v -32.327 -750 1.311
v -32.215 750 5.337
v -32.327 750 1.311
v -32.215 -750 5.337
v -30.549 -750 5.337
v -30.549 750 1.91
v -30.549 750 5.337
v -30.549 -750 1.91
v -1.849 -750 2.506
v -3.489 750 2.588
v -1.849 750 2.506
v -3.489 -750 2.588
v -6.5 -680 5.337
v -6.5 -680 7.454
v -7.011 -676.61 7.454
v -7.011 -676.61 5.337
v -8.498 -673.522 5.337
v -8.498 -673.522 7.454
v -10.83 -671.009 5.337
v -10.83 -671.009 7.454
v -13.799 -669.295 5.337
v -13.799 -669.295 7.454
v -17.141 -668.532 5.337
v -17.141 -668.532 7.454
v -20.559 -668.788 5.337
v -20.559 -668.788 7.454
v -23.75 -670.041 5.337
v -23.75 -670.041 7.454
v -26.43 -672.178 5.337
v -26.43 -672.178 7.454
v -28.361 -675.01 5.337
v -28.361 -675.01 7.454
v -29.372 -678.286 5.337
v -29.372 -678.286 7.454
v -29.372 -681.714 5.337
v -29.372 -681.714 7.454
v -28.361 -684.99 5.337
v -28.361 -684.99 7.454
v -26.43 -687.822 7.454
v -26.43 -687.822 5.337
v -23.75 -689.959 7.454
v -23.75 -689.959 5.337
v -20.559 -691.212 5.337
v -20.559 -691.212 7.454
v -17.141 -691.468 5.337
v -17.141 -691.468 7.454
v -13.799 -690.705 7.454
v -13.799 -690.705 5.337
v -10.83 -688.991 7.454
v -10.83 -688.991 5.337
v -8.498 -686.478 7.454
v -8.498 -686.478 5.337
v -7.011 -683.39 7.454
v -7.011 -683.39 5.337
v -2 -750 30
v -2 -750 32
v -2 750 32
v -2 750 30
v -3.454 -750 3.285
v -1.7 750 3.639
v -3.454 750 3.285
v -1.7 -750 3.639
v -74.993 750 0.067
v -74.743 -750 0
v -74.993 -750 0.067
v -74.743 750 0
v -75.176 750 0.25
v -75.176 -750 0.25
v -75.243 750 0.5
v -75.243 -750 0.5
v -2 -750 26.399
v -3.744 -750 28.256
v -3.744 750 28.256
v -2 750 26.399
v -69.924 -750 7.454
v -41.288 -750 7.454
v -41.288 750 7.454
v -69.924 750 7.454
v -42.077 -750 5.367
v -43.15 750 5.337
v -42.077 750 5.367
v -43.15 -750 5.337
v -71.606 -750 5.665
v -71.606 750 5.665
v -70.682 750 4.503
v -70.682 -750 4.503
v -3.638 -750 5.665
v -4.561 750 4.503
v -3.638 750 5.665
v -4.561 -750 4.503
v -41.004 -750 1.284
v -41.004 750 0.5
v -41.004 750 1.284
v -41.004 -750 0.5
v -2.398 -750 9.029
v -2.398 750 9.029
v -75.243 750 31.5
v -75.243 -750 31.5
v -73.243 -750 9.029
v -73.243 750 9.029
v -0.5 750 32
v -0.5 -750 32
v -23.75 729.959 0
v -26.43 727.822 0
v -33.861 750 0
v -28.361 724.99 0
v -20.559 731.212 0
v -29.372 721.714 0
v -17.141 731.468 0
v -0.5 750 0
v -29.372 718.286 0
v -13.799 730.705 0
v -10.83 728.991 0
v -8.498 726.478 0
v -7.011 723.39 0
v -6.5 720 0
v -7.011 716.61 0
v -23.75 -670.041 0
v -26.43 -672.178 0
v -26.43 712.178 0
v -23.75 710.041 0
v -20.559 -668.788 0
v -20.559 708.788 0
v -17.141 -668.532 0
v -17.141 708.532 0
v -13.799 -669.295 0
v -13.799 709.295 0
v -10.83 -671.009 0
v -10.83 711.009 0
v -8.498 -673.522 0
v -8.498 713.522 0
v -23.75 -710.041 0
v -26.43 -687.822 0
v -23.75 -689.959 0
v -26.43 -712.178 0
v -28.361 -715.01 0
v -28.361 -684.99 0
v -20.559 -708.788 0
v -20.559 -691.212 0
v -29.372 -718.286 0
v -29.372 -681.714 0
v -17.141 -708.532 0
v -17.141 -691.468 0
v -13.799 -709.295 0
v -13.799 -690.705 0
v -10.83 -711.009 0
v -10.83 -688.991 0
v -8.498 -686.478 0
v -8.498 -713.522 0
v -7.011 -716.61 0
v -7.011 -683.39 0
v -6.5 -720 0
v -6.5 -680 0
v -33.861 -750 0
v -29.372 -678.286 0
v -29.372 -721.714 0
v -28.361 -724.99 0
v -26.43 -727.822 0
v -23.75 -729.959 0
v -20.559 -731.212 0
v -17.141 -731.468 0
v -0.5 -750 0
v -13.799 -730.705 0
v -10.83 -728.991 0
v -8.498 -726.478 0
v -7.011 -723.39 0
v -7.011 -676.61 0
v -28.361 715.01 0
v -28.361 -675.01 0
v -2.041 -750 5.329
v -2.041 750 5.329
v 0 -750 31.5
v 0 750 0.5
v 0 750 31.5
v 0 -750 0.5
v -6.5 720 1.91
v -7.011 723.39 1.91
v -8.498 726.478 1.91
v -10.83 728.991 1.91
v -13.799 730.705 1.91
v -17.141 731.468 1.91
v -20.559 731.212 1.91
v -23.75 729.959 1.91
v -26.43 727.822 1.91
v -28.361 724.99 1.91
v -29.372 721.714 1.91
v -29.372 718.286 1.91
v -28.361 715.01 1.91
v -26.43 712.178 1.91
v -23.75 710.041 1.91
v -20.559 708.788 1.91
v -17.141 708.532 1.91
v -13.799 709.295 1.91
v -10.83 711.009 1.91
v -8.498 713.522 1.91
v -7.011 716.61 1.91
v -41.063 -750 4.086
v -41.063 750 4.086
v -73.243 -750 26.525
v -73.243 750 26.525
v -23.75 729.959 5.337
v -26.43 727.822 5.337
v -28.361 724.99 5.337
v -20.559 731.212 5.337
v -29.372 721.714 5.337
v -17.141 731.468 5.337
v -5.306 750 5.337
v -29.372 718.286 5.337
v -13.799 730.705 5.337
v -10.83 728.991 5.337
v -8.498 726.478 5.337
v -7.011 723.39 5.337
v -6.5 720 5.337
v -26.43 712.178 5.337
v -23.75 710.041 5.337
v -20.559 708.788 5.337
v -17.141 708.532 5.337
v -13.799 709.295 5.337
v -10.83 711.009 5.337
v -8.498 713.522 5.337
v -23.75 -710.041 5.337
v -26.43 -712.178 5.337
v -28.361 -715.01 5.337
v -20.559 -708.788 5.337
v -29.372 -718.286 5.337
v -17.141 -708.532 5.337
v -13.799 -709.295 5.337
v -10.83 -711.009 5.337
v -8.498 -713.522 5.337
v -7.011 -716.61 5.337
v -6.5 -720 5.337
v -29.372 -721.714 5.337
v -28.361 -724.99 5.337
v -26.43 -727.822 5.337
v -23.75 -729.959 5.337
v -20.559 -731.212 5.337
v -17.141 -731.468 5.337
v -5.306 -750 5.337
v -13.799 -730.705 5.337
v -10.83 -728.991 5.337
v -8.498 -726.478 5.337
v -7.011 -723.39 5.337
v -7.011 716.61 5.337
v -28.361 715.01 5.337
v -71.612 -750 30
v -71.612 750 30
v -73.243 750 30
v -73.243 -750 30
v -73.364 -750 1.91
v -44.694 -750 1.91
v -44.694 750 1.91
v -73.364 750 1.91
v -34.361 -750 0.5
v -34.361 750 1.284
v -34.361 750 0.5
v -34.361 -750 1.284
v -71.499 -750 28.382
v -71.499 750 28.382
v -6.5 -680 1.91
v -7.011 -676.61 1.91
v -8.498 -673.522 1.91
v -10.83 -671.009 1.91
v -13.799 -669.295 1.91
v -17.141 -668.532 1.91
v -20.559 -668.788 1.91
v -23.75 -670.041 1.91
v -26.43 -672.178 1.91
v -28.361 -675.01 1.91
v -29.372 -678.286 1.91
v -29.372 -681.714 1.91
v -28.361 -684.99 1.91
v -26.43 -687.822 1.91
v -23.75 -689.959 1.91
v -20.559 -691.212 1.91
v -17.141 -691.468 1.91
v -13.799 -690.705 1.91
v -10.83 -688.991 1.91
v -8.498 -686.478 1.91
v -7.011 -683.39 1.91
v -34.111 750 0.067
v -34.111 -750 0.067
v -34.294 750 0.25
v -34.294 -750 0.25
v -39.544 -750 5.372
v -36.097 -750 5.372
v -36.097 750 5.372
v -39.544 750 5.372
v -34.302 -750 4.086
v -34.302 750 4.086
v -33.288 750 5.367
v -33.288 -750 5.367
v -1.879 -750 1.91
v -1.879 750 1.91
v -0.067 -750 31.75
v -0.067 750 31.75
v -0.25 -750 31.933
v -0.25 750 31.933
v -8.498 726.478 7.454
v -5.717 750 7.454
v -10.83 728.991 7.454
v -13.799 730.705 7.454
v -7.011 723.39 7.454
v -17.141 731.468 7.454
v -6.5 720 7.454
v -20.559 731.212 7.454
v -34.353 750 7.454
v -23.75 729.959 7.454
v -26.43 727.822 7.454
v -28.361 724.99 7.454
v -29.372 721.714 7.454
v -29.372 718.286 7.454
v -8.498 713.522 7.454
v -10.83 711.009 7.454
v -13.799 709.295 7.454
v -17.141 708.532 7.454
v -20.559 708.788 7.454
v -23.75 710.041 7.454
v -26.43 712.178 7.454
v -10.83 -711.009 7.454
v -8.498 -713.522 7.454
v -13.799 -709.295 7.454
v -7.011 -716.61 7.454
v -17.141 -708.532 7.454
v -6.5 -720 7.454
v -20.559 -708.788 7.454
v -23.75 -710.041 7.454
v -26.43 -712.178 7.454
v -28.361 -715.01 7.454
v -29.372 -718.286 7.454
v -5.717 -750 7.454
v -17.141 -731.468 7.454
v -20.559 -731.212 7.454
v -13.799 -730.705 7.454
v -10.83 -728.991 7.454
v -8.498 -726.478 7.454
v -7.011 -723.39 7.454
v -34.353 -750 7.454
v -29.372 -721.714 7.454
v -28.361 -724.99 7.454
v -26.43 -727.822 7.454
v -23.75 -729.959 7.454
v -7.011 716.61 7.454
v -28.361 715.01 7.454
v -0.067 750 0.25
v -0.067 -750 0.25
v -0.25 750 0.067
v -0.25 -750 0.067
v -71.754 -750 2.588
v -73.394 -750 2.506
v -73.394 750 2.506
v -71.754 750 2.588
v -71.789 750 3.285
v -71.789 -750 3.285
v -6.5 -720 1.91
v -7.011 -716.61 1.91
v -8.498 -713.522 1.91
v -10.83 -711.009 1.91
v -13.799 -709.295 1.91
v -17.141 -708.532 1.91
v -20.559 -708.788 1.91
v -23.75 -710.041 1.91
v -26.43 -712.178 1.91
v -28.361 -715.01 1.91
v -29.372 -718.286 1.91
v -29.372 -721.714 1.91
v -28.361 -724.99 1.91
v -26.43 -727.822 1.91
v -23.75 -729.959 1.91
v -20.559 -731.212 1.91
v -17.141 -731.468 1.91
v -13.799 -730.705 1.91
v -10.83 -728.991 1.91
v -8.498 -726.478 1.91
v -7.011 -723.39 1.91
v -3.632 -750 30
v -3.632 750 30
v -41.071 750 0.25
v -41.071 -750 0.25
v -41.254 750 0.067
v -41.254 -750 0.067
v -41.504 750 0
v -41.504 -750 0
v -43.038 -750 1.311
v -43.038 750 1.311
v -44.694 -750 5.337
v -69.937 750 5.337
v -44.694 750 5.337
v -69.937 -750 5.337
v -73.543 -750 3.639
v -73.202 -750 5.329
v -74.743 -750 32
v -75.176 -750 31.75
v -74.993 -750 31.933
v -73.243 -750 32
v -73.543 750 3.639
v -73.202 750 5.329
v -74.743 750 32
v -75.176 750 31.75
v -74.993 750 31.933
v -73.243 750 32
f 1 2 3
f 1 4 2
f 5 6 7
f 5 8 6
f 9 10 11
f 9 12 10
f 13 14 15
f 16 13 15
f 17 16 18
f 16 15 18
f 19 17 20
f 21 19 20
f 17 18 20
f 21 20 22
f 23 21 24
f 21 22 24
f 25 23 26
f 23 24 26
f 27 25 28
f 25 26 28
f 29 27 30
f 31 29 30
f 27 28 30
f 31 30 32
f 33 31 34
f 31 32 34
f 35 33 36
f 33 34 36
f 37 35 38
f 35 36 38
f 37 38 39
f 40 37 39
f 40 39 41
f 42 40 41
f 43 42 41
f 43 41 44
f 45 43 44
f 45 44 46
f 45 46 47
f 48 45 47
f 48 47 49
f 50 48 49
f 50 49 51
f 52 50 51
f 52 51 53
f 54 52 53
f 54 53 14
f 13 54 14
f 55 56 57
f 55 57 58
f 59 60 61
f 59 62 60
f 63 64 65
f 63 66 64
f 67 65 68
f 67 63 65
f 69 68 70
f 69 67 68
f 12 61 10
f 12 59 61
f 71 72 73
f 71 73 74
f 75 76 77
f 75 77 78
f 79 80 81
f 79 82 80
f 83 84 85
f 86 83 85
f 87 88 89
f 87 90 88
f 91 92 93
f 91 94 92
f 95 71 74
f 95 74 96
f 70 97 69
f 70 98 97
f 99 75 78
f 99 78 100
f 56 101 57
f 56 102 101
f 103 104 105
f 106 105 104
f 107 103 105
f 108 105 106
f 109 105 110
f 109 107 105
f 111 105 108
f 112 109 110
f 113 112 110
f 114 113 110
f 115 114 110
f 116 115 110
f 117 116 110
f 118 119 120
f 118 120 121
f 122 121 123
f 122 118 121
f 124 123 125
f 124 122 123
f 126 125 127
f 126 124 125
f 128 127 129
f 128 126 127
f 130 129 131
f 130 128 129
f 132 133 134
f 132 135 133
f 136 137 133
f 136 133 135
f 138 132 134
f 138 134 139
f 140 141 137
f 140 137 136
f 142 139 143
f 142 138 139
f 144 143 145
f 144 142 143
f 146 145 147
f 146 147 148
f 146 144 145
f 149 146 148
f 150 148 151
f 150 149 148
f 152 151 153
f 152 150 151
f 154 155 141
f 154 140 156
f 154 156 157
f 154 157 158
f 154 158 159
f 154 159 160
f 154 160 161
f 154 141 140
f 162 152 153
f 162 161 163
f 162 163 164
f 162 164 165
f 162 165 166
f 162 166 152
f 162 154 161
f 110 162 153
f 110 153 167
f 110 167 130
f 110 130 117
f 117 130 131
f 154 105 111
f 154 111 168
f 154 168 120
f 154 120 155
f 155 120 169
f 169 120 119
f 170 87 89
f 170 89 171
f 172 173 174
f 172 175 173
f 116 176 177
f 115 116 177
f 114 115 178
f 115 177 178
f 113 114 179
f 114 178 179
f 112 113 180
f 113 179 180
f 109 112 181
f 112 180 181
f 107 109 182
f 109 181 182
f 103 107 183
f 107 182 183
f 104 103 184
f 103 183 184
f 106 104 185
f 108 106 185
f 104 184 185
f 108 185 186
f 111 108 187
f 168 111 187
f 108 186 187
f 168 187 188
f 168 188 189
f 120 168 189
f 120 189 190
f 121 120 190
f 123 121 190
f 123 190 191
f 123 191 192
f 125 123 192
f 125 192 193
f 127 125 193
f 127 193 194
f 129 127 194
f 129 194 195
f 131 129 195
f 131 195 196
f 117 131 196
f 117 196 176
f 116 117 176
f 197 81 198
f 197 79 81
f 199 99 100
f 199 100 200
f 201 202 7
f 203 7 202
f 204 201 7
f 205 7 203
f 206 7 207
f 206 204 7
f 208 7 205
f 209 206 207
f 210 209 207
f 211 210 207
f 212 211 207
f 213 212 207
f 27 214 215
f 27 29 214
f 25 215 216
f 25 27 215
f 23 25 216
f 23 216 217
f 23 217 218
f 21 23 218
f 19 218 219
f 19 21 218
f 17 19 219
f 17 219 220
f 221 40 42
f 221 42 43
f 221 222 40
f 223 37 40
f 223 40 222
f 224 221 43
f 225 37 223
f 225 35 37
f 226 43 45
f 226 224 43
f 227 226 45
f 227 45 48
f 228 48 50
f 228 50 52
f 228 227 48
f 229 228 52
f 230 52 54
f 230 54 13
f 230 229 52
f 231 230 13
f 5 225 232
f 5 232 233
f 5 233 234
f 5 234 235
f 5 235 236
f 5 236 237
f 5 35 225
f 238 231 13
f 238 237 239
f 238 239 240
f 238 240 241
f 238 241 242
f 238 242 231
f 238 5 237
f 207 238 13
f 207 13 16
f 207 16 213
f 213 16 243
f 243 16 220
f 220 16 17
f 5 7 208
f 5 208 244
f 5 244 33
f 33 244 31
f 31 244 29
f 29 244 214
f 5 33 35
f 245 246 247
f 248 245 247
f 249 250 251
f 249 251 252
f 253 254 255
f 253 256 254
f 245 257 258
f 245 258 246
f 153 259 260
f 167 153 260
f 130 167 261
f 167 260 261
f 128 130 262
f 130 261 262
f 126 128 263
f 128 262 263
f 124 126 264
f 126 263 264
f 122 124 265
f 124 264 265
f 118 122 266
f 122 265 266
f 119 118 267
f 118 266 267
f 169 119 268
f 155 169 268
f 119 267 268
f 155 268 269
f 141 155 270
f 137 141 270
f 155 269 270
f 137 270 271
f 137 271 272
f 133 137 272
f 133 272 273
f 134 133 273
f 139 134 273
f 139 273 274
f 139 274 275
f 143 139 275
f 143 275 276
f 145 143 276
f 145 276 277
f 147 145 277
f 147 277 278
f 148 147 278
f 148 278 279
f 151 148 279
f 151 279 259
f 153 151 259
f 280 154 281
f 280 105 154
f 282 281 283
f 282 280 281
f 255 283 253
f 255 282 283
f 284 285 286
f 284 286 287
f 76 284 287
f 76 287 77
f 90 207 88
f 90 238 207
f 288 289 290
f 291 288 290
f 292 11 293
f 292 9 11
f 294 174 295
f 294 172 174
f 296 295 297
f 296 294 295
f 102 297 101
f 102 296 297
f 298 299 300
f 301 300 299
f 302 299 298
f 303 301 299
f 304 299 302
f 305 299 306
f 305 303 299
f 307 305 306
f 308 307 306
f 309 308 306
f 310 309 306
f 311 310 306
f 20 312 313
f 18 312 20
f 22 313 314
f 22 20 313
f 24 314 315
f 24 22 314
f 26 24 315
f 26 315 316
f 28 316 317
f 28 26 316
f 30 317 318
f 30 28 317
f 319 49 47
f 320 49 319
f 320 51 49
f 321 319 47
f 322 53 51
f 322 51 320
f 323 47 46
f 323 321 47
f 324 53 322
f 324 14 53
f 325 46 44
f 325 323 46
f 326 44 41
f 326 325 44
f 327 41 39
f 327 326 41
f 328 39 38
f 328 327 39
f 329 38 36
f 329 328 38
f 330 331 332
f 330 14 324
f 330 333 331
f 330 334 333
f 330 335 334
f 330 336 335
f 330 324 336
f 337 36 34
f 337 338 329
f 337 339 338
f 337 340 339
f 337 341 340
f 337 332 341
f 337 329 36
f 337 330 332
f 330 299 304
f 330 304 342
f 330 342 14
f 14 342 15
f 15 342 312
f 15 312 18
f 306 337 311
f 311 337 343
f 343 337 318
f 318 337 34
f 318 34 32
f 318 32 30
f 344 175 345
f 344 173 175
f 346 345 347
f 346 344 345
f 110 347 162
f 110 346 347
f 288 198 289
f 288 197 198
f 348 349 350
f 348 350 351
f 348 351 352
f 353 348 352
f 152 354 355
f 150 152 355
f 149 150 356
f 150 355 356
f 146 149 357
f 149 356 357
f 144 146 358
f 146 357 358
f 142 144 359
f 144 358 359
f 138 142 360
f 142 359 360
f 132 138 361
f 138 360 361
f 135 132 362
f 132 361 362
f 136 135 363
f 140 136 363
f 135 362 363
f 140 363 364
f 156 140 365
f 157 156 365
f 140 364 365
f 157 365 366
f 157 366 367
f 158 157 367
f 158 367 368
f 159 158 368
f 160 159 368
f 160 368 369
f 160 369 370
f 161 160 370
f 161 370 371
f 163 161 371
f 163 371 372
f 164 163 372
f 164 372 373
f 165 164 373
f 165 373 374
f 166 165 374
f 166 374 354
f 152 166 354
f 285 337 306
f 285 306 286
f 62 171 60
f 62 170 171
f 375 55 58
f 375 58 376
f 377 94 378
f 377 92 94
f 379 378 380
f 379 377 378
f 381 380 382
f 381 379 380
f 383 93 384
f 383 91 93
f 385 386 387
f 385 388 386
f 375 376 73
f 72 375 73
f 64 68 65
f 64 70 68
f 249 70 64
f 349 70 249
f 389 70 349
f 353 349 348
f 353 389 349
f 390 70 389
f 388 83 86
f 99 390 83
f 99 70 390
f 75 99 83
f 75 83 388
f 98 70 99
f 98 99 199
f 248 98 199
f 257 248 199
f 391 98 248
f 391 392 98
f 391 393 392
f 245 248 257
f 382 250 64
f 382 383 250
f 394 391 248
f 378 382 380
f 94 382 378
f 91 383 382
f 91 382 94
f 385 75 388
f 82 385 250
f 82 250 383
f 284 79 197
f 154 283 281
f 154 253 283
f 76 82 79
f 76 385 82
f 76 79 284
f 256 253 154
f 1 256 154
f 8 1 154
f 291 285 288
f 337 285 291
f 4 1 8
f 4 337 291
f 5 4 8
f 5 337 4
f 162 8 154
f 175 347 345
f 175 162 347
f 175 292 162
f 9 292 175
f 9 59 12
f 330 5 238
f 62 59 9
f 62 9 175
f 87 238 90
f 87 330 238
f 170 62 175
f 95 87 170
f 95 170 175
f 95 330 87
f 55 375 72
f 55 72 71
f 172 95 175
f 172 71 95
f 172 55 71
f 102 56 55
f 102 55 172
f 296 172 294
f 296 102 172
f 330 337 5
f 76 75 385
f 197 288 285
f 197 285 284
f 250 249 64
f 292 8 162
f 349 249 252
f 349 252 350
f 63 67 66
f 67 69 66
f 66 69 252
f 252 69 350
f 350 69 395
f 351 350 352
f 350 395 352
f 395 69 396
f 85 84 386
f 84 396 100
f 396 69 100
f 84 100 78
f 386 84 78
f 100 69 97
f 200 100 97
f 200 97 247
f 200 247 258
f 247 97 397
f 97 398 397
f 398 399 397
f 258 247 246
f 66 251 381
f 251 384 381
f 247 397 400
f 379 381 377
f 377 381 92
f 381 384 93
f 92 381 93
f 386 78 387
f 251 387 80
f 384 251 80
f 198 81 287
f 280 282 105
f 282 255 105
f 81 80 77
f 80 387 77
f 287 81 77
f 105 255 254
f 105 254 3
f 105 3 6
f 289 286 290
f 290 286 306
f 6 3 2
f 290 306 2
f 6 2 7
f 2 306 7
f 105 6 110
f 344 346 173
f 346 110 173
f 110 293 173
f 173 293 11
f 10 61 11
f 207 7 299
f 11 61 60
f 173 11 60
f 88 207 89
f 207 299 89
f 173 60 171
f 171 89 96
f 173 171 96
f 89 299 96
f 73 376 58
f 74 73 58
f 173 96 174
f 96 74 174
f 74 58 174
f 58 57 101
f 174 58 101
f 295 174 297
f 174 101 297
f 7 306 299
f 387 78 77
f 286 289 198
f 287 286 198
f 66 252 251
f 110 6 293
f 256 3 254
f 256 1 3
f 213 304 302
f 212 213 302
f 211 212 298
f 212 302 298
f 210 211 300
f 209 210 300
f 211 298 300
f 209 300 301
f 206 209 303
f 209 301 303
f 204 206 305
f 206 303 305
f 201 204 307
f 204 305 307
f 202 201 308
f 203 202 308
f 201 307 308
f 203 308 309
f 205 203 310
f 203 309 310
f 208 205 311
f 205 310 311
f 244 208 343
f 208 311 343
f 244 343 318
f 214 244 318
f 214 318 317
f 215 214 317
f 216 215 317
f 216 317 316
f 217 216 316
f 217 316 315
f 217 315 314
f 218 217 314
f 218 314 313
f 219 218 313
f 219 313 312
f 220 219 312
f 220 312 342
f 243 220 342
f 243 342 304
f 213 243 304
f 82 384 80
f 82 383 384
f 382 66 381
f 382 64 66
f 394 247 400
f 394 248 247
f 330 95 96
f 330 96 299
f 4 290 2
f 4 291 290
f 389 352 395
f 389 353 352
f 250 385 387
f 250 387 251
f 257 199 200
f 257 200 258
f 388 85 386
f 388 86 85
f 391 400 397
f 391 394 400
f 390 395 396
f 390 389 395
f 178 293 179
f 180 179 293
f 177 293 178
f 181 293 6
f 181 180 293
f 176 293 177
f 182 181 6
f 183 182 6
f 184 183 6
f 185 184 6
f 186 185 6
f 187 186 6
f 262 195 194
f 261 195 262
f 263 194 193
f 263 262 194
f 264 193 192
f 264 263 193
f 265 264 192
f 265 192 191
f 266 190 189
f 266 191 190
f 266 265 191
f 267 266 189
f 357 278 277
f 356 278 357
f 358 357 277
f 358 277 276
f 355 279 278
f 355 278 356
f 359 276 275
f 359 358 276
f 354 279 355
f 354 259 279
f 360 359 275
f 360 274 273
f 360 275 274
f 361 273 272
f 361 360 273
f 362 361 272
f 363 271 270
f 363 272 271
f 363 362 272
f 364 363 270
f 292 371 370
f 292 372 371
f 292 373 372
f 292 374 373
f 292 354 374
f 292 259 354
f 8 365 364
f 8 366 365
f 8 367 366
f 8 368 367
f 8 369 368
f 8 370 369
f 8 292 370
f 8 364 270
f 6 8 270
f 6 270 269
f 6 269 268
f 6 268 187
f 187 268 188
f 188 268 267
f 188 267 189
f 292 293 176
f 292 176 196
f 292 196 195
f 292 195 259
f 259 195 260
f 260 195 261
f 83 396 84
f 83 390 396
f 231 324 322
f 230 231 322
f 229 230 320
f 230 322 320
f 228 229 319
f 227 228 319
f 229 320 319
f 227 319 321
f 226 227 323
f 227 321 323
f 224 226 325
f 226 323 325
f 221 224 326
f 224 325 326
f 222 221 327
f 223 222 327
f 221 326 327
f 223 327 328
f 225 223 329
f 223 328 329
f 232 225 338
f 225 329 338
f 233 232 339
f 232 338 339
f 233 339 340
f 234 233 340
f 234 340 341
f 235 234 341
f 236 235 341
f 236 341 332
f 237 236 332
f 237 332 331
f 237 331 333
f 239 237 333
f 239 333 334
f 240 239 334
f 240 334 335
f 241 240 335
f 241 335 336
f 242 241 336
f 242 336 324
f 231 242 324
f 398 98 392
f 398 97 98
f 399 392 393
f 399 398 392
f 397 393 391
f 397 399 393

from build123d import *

# Parameters (mm, degrees)
F1_DEPTH = 750
F2_R     = 0.5
F3_R     = 11.5
F4_DEPTH = 25.4


with BuildPart() as f1:
    # F0 (on Front) → F1 (new body, symmetric)
    with BuildSketch(Plane.XZ):
        Polygon((-0.121622, 0), (0, 0), (0, 32), (-2, 32), (-2, 30), (-3.631513, 30), (-3.744032, 28.255974), (-2, 26.399431), (-2.397815, 9.028868), (-5.717093, 7.453618), (-34.352882, 7.453618), (-36.09691, 5.372039), (-39.544148, 5.372039), (-41.288176, 7.453618), (-69.923965, 7.453618), (-73.243243, 9.028868), (-73.243243, 26.525391), (-71.499211, 28.381934), (-71.61173, 30), (-73.243243, 30), (-73.243243, 32), (-75.243243, 32), (-75.243243, 0), (-41.003749, 0), (-41.003749, 1.284304), (-43.03767, 1.311418), (-43.149501, 5.337393), (-42.076625, 5.367195), (-41.063354, 4.085704), (-37.743243, 4.085704), (-34.301511, 4.085704), (-33.28824, 5.367195), (-32.215363, 5.337393), (-32.327195, 1.311418), (-34.361116, 1.284304), (-34.361116, 0), align=None)
        Polygon((-44.694386, 5.337393), (-44.694386, 1.910149), (-73.364027, 1.910149), (-73.393829, 2.506191), (-71.754345, 2.588166), (-71.789201, 3.285283), (-73.542841, 3.638672), (-73.202291, 5.328597), (-71.605705, 5.665216), (-70.68184, 4.502933), (-69.936782, 5.337393), align=None, mode=Mode.SUBTRACT)
        Polygon((-3.637539, 5.665216), (-2.040952, 5.328597), (-1.700402, 3.638672), (-3.454042, 3.285283), (-3.488898, 2.588166), (-1.849414, 2.506191), (-1.879216, 1.910149), (-30.548857, 1.910149), (-30.548857, 5.337393), (-5.306461, 5.337393), (-4.561403, 4.502933), align=None, mode=Mode.SUBTRACT)
    extrude(amount=F1_DEPTH, both=True)

    # F2
    f2_edges = [f1.edges().sort_by_distance(p)[0] for p in [
        (-75.243243, 0, 32),
        (0, 0, 32),
        (0, 0, 0),
        (-75.243243, 0, 0),
        (-41.003749, 0, 0),
        (-34.361116, 0, 0),
    ]]
    fillet(f2_edges, radius=F2_R)

    # F3 (on face) → F4 (cut)
    with BuildSketch(Plane.XY.offset(7.453618)):
        with Locations((-18, -720)):
            Circle(F3_R)
        with Locations((-18, -680)):
            Circle(F3_R)
        with Locations((-18, 720)):
            Circle(F3_R)
    extrude(amount=-F4_DEPTH, mode=Mode.SUBTRACT)


solid = f1.part
